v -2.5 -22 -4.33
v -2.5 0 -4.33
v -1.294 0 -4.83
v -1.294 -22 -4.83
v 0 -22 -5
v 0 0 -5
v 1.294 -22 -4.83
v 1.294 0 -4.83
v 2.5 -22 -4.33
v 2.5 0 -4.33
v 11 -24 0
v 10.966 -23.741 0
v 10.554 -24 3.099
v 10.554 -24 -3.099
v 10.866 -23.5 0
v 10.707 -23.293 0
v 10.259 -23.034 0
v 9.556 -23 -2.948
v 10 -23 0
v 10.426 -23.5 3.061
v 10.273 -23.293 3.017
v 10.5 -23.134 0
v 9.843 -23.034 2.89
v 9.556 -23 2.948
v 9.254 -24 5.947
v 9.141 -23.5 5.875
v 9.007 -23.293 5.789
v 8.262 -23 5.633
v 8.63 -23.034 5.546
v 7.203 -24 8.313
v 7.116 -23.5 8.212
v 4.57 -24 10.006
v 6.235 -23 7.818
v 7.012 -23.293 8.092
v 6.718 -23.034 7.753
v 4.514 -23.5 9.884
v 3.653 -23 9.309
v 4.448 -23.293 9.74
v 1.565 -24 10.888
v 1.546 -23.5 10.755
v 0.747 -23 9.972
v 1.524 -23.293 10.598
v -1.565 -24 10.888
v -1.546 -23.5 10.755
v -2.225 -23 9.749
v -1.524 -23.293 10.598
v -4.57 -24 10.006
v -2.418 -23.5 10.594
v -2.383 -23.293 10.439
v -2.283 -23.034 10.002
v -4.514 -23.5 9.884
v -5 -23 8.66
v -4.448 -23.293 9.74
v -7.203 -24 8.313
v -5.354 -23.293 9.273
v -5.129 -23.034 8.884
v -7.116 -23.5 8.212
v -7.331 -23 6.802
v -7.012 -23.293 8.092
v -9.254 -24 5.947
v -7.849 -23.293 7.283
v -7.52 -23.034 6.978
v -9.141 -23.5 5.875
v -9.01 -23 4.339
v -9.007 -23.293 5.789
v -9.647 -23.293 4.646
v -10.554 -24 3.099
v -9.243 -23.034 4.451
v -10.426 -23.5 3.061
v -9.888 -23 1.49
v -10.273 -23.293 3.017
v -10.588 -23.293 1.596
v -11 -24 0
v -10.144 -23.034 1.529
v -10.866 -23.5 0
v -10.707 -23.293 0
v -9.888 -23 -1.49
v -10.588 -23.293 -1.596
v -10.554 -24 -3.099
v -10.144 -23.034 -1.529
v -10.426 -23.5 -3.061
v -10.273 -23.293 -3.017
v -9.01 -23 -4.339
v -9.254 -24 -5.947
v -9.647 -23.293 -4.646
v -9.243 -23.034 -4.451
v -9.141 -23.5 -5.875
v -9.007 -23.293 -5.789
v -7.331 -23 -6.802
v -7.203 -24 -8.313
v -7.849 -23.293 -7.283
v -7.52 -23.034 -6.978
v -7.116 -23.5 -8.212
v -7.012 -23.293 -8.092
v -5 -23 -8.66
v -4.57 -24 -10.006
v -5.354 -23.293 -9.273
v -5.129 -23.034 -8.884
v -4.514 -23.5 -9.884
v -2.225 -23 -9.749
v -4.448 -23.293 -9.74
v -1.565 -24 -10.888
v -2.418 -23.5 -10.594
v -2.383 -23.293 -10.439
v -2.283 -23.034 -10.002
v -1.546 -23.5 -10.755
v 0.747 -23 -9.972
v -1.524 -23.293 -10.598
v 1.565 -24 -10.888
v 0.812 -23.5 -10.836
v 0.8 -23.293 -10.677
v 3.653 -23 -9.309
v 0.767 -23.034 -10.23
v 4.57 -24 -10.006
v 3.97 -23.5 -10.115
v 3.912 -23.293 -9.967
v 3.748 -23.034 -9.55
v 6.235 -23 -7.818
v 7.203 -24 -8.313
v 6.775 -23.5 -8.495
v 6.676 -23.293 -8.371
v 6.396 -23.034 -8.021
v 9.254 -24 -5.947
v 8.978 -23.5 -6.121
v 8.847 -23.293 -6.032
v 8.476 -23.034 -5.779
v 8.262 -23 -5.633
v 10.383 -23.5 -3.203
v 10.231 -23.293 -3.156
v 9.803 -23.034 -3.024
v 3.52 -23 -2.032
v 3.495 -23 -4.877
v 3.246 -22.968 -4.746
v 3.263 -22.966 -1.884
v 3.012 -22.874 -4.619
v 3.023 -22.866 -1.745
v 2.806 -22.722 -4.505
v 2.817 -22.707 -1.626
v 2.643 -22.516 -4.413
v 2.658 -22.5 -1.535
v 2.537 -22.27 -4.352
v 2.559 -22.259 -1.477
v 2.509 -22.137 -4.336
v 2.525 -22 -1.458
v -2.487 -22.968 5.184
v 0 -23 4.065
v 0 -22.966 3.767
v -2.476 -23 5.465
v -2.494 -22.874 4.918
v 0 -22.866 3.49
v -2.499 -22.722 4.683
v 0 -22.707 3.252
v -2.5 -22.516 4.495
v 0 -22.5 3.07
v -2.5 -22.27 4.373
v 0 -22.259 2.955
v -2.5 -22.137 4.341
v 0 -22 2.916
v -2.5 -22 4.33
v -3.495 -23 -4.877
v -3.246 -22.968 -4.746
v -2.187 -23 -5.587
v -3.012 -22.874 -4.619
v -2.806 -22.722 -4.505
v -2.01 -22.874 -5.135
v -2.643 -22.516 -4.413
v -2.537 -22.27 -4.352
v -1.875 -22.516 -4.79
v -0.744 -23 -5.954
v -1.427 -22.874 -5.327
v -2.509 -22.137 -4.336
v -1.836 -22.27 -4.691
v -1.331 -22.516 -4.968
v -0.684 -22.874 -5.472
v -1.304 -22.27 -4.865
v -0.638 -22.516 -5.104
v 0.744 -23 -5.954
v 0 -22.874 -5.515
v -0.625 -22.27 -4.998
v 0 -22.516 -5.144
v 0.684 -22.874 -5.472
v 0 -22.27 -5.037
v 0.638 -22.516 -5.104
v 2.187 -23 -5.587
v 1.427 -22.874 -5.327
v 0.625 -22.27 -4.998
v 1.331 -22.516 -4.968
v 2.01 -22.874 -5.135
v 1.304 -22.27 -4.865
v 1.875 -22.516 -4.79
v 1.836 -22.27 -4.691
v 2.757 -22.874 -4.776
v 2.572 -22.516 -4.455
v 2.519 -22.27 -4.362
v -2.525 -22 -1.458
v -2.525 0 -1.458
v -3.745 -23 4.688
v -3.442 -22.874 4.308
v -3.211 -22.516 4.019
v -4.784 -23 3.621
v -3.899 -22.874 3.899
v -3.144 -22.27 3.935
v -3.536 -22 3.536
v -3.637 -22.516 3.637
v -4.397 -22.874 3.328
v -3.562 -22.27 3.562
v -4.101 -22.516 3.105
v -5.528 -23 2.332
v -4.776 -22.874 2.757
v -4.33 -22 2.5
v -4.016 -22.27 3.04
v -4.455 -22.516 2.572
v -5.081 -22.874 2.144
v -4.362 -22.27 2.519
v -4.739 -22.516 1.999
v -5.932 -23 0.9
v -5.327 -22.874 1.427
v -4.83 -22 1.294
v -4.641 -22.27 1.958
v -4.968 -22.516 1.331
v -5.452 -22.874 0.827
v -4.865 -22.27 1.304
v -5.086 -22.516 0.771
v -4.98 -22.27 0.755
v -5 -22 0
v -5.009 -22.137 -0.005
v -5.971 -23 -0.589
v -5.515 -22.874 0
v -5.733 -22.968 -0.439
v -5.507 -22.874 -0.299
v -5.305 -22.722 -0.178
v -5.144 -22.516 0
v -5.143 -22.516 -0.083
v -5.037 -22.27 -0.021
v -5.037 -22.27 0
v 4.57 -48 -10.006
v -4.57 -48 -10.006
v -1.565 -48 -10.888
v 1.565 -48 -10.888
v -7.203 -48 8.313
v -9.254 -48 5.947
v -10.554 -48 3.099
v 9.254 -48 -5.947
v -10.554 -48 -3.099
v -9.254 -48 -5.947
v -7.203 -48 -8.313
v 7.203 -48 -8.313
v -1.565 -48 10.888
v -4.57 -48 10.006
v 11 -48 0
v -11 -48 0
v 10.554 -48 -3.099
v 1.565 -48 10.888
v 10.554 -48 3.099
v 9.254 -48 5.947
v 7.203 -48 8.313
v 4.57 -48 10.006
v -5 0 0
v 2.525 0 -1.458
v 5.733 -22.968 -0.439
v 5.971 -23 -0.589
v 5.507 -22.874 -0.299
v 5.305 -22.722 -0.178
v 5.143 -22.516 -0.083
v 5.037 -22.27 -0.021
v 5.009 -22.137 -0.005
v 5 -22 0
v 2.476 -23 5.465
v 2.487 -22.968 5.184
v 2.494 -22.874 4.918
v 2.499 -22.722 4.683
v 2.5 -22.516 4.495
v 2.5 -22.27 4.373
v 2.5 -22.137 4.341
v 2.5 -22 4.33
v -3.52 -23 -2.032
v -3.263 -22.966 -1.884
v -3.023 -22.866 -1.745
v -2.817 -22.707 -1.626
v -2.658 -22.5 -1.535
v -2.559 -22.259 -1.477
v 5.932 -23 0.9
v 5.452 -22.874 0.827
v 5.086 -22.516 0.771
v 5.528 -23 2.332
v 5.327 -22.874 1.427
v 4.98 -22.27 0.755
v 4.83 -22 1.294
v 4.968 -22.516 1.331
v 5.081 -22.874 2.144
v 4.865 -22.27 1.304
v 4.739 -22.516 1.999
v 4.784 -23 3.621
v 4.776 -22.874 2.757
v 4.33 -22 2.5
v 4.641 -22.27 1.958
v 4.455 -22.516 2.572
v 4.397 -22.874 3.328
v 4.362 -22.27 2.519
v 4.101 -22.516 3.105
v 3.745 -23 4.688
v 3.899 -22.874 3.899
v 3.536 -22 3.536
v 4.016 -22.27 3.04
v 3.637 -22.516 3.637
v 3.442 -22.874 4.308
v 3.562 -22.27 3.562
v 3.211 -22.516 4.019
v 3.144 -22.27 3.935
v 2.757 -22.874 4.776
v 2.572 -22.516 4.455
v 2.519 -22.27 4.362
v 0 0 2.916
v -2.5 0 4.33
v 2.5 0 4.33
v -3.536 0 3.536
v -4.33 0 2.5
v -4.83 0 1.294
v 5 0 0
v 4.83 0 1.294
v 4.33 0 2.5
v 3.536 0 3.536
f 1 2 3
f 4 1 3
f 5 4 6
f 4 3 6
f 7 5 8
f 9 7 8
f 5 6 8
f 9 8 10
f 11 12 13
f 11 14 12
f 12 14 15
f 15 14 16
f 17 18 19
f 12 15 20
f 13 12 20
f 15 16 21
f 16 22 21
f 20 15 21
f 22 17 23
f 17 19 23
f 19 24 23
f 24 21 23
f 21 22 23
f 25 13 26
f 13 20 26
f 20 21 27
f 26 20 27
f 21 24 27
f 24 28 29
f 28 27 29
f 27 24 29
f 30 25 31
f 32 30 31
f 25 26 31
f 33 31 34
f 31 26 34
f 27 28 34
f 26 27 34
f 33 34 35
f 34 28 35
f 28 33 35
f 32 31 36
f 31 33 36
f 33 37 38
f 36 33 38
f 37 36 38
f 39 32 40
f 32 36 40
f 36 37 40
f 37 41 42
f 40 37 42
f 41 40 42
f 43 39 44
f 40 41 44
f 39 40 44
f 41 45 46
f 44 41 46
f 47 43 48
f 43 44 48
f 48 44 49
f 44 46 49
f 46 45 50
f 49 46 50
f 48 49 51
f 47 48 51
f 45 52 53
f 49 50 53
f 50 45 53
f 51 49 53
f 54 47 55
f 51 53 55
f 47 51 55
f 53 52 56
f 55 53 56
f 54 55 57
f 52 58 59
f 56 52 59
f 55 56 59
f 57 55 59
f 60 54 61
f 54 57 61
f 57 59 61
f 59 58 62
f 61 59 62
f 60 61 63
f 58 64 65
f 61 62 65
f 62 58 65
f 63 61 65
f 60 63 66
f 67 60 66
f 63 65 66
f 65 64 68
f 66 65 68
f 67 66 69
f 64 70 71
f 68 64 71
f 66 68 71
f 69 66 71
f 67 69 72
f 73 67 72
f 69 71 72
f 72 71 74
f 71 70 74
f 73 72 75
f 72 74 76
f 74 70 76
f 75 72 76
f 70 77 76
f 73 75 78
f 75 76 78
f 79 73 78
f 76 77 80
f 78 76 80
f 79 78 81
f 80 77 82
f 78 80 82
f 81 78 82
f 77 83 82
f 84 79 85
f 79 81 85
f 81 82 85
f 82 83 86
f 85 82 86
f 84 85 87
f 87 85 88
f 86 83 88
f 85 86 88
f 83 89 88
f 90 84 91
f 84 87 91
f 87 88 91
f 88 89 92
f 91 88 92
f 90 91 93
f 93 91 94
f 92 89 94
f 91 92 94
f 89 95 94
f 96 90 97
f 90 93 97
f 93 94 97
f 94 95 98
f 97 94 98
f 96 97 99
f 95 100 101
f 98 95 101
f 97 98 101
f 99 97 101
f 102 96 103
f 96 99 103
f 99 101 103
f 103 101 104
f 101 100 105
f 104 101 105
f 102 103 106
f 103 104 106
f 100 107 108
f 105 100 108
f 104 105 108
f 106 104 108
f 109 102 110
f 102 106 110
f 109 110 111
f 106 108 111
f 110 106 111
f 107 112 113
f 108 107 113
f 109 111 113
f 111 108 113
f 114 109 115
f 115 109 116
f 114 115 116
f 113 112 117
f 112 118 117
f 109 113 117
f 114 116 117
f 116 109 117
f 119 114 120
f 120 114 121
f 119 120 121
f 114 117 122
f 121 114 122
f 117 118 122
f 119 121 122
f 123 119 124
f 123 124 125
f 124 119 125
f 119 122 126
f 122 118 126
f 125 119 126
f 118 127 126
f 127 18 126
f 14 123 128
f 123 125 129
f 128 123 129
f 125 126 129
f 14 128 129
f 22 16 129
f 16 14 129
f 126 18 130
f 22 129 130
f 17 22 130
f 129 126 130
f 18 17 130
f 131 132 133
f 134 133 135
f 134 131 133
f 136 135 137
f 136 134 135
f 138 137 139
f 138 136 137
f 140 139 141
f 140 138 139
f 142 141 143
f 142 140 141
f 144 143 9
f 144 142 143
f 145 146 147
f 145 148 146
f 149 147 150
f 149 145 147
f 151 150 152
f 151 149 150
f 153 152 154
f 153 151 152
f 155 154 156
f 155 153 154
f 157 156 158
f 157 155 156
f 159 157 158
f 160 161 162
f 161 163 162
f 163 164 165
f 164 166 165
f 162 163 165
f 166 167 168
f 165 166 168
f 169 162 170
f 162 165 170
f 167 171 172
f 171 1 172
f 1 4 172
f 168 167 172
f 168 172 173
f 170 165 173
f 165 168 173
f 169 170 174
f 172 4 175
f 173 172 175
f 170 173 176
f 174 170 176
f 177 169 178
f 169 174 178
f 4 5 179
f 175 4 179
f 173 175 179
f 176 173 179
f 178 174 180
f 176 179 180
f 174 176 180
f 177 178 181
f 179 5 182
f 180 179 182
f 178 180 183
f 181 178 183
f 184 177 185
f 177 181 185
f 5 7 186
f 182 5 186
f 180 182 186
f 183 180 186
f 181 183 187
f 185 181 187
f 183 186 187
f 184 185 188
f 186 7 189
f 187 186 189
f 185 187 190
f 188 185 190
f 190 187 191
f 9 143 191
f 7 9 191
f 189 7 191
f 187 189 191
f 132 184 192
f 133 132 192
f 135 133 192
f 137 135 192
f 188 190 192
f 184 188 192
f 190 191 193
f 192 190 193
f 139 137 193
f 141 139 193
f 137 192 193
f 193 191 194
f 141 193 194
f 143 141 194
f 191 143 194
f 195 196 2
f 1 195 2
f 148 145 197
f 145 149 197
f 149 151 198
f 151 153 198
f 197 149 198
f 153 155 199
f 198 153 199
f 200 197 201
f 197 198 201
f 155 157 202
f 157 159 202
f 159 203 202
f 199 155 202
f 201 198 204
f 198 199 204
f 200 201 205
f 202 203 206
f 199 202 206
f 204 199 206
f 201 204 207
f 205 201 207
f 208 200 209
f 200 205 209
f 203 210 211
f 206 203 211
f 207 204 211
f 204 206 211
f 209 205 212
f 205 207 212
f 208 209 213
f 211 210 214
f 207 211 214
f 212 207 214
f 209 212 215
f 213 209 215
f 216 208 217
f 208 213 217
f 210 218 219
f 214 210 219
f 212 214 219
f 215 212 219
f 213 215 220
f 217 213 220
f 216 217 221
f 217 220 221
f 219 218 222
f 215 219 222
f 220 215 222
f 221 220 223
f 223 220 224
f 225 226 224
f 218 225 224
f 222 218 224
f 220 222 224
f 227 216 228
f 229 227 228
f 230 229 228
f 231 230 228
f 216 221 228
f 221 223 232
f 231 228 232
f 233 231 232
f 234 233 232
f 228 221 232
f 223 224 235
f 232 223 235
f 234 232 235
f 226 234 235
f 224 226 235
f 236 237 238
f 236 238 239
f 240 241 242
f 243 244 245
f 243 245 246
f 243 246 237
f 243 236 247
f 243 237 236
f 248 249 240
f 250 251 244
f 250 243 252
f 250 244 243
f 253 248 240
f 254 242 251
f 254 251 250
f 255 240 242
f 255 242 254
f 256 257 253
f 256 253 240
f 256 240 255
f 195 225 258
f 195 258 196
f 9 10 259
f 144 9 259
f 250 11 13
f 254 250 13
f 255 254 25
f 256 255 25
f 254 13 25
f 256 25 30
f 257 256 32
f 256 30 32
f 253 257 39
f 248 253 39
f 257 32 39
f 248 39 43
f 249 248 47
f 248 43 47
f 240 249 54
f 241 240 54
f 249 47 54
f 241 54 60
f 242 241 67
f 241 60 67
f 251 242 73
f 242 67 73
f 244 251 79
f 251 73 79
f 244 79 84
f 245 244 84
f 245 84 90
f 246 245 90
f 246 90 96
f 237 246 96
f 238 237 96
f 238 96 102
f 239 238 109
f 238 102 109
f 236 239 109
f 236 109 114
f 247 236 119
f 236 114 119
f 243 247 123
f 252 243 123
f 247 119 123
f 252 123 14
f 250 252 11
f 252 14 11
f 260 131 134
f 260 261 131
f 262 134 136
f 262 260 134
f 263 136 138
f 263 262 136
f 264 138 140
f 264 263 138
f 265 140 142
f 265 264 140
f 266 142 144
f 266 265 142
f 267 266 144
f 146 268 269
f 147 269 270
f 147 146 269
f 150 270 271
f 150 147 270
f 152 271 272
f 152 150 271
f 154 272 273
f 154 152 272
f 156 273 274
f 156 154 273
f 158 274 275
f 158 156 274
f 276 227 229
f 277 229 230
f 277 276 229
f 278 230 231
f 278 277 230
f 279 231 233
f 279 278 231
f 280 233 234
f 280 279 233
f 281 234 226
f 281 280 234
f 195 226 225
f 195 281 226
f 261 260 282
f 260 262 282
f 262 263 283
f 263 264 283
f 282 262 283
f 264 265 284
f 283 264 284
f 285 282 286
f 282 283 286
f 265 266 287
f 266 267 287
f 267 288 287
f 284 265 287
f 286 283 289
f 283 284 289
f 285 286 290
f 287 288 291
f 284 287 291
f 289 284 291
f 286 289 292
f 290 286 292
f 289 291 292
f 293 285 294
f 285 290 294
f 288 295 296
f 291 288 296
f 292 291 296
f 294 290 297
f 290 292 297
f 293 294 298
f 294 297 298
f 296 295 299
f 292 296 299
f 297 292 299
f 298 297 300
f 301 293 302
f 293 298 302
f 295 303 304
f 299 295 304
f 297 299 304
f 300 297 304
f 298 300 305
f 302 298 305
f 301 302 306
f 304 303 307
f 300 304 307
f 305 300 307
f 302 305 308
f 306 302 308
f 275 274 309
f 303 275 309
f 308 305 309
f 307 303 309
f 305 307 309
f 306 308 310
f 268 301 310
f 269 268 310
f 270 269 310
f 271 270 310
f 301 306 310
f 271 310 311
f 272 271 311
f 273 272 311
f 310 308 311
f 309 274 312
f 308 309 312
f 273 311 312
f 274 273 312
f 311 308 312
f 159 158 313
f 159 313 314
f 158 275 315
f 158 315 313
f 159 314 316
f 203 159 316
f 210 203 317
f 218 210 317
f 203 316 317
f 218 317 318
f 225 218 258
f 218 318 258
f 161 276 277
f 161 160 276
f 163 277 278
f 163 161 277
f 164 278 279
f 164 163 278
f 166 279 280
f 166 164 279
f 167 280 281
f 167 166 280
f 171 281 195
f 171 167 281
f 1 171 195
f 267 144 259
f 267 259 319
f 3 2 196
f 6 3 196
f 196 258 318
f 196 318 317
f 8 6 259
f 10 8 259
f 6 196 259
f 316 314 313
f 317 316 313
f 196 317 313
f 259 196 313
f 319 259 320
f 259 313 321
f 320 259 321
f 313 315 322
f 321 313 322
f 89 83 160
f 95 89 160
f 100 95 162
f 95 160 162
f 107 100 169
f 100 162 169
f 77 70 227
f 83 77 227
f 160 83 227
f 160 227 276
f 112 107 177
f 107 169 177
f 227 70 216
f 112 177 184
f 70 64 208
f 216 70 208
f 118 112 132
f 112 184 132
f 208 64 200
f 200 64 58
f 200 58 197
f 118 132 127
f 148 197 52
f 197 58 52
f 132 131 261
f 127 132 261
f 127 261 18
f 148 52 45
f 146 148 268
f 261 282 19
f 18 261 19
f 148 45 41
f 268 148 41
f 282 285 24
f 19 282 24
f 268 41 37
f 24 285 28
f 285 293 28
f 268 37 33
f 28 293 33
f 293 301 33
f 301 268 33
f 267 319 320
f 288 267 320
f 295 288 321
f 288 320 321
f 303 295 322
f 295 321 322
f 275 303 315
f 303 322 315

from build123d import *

# Parameters (mm, degrees)
F1_DEPTH = 23
F2_DEPTH = 23
F3_R     = 11
F4_DEPTH = 25
F5_R     = 1


with BuildPart() as f1:
    # F0 (on Front) → F1 (new body)
    with BuildSketch(Plane.XZ):
        Polygon((2.5250660033, -1.4578475367), (5, 0), (2.5, 4.3301270189), (0, 2.9156950735), (-2.5, 4.3301270189), (-5, 0), (-2.5250660033, -1.4578475367), (-2.5, -4.3301270189), (2.5, -4.3301270189), align=None)
    extrude(amount=F1_DEPTH)

    # F0 (on Front) → F2 (join, through all)
    with BuildSketch(Plane.XZ):
        with BuildLine():
            Line((2.5, 4.3301270189), (5, 0))
            ThreePointArc((5, 0), (4.3301270189, 2.5), (2.5, 4.3301270189))
        make_face()
        with BuildLine():
            Line((-5, 0), (-2.5, 4.3301270189))
            ThreePointArc((-2.5, 4.3301270189), (-4.3301270189, 2.5), (-5, 0))
        make_face()
        with BuildLine():
            ThreePointArc((-2.5, -4.3301270189), (0, -5), (2.5, -4.3301270189))
            Line((2.5, -4.3301270189), (-2.5, -4.3301270189))
        make_face()
    extrude(amount=F2_DEPTH)

    # F3 (on face) → F4 (join)
    with BuildSketch(Plane.XZ.offset(23)):
        Circle(F3_R)
        with BuildLine():
            Line((5, 0), (2.5250660033, -1.4578475367))
            Line((2.5250660033, -1.4578475367), (2.5, -4.3301270189))
            ThreePointArc((2.5, -4.3301270189), (0, -5), (-2.5, -4.3301270189))
            Line((-2.5, -4.3301270189), (-2.5250660033, -1.4578475367))
            Line((-2.5250660033, -1.4578475367), (-5, 0))
            ThreePointArc((-5, 0), (-4.3301270189, 2.5), (-2.5, 4.3301270189))
            Line((-2.5, 4.3301270189), (0, 2.9156950735))
            Line((0, 2.9156950735), (2.5, 4.3301270189))
            ThreePointArc((2.5, 4.3301270189), (4.3301270189, 2.5), (5, 0))
        make_face(mode=Mode.SUBTRACT)
        with BuildLine():
            Line((2.5, -4.3301270189), (2.5250660033, -1.4578475367))
            Line((2.5250660033, -1.4578475367), (5, 0))
            ThreePointArc((5, 0), (4.3301270189, 2.5), (2.5, 4.3301270189))
            Line((2.5, 4.3301270189), (0, 2.9156950735))
            Line((0, 2.9156950735), (-2.5, 4.3301270189))
            ThreePointArc((-2.5, 4.3301270189), (-4.3301270189, 2.5), (-5, 0))
            Line((-5, 0), (-2.5250660033, -1.4578475367))
            Line((-2.5250660033, -1.4578475367), (-2.5, -4.3301270189))
            ThreePointArc((-2.5, -4.3301270189), (0, -5), (2.5, -4.3301270189))
        make_face()
    extrude(amount=F4_DEPTH)

    # F5
    f5_edges = [f1.edges().sort_by_distance(p)[0] for p in [
        (-11, -23, 0),
        (3.762533, -23, -0.728924),
        (4.330127, -23, 2.5),
        (1.25, -23, 3.622911),
        (-1.25, -23, 3.622911),
        (-4.330127, -23, 2.5),
        (-3.762533, -23, -0.728924),
        (-2.512533, -23, -2.893987),
        (0, -23, -5),
        (2.512533, -23, -2.893987),
    ]]
    fillet(f5_edges, radius=F5_R)


solid = f1.part
